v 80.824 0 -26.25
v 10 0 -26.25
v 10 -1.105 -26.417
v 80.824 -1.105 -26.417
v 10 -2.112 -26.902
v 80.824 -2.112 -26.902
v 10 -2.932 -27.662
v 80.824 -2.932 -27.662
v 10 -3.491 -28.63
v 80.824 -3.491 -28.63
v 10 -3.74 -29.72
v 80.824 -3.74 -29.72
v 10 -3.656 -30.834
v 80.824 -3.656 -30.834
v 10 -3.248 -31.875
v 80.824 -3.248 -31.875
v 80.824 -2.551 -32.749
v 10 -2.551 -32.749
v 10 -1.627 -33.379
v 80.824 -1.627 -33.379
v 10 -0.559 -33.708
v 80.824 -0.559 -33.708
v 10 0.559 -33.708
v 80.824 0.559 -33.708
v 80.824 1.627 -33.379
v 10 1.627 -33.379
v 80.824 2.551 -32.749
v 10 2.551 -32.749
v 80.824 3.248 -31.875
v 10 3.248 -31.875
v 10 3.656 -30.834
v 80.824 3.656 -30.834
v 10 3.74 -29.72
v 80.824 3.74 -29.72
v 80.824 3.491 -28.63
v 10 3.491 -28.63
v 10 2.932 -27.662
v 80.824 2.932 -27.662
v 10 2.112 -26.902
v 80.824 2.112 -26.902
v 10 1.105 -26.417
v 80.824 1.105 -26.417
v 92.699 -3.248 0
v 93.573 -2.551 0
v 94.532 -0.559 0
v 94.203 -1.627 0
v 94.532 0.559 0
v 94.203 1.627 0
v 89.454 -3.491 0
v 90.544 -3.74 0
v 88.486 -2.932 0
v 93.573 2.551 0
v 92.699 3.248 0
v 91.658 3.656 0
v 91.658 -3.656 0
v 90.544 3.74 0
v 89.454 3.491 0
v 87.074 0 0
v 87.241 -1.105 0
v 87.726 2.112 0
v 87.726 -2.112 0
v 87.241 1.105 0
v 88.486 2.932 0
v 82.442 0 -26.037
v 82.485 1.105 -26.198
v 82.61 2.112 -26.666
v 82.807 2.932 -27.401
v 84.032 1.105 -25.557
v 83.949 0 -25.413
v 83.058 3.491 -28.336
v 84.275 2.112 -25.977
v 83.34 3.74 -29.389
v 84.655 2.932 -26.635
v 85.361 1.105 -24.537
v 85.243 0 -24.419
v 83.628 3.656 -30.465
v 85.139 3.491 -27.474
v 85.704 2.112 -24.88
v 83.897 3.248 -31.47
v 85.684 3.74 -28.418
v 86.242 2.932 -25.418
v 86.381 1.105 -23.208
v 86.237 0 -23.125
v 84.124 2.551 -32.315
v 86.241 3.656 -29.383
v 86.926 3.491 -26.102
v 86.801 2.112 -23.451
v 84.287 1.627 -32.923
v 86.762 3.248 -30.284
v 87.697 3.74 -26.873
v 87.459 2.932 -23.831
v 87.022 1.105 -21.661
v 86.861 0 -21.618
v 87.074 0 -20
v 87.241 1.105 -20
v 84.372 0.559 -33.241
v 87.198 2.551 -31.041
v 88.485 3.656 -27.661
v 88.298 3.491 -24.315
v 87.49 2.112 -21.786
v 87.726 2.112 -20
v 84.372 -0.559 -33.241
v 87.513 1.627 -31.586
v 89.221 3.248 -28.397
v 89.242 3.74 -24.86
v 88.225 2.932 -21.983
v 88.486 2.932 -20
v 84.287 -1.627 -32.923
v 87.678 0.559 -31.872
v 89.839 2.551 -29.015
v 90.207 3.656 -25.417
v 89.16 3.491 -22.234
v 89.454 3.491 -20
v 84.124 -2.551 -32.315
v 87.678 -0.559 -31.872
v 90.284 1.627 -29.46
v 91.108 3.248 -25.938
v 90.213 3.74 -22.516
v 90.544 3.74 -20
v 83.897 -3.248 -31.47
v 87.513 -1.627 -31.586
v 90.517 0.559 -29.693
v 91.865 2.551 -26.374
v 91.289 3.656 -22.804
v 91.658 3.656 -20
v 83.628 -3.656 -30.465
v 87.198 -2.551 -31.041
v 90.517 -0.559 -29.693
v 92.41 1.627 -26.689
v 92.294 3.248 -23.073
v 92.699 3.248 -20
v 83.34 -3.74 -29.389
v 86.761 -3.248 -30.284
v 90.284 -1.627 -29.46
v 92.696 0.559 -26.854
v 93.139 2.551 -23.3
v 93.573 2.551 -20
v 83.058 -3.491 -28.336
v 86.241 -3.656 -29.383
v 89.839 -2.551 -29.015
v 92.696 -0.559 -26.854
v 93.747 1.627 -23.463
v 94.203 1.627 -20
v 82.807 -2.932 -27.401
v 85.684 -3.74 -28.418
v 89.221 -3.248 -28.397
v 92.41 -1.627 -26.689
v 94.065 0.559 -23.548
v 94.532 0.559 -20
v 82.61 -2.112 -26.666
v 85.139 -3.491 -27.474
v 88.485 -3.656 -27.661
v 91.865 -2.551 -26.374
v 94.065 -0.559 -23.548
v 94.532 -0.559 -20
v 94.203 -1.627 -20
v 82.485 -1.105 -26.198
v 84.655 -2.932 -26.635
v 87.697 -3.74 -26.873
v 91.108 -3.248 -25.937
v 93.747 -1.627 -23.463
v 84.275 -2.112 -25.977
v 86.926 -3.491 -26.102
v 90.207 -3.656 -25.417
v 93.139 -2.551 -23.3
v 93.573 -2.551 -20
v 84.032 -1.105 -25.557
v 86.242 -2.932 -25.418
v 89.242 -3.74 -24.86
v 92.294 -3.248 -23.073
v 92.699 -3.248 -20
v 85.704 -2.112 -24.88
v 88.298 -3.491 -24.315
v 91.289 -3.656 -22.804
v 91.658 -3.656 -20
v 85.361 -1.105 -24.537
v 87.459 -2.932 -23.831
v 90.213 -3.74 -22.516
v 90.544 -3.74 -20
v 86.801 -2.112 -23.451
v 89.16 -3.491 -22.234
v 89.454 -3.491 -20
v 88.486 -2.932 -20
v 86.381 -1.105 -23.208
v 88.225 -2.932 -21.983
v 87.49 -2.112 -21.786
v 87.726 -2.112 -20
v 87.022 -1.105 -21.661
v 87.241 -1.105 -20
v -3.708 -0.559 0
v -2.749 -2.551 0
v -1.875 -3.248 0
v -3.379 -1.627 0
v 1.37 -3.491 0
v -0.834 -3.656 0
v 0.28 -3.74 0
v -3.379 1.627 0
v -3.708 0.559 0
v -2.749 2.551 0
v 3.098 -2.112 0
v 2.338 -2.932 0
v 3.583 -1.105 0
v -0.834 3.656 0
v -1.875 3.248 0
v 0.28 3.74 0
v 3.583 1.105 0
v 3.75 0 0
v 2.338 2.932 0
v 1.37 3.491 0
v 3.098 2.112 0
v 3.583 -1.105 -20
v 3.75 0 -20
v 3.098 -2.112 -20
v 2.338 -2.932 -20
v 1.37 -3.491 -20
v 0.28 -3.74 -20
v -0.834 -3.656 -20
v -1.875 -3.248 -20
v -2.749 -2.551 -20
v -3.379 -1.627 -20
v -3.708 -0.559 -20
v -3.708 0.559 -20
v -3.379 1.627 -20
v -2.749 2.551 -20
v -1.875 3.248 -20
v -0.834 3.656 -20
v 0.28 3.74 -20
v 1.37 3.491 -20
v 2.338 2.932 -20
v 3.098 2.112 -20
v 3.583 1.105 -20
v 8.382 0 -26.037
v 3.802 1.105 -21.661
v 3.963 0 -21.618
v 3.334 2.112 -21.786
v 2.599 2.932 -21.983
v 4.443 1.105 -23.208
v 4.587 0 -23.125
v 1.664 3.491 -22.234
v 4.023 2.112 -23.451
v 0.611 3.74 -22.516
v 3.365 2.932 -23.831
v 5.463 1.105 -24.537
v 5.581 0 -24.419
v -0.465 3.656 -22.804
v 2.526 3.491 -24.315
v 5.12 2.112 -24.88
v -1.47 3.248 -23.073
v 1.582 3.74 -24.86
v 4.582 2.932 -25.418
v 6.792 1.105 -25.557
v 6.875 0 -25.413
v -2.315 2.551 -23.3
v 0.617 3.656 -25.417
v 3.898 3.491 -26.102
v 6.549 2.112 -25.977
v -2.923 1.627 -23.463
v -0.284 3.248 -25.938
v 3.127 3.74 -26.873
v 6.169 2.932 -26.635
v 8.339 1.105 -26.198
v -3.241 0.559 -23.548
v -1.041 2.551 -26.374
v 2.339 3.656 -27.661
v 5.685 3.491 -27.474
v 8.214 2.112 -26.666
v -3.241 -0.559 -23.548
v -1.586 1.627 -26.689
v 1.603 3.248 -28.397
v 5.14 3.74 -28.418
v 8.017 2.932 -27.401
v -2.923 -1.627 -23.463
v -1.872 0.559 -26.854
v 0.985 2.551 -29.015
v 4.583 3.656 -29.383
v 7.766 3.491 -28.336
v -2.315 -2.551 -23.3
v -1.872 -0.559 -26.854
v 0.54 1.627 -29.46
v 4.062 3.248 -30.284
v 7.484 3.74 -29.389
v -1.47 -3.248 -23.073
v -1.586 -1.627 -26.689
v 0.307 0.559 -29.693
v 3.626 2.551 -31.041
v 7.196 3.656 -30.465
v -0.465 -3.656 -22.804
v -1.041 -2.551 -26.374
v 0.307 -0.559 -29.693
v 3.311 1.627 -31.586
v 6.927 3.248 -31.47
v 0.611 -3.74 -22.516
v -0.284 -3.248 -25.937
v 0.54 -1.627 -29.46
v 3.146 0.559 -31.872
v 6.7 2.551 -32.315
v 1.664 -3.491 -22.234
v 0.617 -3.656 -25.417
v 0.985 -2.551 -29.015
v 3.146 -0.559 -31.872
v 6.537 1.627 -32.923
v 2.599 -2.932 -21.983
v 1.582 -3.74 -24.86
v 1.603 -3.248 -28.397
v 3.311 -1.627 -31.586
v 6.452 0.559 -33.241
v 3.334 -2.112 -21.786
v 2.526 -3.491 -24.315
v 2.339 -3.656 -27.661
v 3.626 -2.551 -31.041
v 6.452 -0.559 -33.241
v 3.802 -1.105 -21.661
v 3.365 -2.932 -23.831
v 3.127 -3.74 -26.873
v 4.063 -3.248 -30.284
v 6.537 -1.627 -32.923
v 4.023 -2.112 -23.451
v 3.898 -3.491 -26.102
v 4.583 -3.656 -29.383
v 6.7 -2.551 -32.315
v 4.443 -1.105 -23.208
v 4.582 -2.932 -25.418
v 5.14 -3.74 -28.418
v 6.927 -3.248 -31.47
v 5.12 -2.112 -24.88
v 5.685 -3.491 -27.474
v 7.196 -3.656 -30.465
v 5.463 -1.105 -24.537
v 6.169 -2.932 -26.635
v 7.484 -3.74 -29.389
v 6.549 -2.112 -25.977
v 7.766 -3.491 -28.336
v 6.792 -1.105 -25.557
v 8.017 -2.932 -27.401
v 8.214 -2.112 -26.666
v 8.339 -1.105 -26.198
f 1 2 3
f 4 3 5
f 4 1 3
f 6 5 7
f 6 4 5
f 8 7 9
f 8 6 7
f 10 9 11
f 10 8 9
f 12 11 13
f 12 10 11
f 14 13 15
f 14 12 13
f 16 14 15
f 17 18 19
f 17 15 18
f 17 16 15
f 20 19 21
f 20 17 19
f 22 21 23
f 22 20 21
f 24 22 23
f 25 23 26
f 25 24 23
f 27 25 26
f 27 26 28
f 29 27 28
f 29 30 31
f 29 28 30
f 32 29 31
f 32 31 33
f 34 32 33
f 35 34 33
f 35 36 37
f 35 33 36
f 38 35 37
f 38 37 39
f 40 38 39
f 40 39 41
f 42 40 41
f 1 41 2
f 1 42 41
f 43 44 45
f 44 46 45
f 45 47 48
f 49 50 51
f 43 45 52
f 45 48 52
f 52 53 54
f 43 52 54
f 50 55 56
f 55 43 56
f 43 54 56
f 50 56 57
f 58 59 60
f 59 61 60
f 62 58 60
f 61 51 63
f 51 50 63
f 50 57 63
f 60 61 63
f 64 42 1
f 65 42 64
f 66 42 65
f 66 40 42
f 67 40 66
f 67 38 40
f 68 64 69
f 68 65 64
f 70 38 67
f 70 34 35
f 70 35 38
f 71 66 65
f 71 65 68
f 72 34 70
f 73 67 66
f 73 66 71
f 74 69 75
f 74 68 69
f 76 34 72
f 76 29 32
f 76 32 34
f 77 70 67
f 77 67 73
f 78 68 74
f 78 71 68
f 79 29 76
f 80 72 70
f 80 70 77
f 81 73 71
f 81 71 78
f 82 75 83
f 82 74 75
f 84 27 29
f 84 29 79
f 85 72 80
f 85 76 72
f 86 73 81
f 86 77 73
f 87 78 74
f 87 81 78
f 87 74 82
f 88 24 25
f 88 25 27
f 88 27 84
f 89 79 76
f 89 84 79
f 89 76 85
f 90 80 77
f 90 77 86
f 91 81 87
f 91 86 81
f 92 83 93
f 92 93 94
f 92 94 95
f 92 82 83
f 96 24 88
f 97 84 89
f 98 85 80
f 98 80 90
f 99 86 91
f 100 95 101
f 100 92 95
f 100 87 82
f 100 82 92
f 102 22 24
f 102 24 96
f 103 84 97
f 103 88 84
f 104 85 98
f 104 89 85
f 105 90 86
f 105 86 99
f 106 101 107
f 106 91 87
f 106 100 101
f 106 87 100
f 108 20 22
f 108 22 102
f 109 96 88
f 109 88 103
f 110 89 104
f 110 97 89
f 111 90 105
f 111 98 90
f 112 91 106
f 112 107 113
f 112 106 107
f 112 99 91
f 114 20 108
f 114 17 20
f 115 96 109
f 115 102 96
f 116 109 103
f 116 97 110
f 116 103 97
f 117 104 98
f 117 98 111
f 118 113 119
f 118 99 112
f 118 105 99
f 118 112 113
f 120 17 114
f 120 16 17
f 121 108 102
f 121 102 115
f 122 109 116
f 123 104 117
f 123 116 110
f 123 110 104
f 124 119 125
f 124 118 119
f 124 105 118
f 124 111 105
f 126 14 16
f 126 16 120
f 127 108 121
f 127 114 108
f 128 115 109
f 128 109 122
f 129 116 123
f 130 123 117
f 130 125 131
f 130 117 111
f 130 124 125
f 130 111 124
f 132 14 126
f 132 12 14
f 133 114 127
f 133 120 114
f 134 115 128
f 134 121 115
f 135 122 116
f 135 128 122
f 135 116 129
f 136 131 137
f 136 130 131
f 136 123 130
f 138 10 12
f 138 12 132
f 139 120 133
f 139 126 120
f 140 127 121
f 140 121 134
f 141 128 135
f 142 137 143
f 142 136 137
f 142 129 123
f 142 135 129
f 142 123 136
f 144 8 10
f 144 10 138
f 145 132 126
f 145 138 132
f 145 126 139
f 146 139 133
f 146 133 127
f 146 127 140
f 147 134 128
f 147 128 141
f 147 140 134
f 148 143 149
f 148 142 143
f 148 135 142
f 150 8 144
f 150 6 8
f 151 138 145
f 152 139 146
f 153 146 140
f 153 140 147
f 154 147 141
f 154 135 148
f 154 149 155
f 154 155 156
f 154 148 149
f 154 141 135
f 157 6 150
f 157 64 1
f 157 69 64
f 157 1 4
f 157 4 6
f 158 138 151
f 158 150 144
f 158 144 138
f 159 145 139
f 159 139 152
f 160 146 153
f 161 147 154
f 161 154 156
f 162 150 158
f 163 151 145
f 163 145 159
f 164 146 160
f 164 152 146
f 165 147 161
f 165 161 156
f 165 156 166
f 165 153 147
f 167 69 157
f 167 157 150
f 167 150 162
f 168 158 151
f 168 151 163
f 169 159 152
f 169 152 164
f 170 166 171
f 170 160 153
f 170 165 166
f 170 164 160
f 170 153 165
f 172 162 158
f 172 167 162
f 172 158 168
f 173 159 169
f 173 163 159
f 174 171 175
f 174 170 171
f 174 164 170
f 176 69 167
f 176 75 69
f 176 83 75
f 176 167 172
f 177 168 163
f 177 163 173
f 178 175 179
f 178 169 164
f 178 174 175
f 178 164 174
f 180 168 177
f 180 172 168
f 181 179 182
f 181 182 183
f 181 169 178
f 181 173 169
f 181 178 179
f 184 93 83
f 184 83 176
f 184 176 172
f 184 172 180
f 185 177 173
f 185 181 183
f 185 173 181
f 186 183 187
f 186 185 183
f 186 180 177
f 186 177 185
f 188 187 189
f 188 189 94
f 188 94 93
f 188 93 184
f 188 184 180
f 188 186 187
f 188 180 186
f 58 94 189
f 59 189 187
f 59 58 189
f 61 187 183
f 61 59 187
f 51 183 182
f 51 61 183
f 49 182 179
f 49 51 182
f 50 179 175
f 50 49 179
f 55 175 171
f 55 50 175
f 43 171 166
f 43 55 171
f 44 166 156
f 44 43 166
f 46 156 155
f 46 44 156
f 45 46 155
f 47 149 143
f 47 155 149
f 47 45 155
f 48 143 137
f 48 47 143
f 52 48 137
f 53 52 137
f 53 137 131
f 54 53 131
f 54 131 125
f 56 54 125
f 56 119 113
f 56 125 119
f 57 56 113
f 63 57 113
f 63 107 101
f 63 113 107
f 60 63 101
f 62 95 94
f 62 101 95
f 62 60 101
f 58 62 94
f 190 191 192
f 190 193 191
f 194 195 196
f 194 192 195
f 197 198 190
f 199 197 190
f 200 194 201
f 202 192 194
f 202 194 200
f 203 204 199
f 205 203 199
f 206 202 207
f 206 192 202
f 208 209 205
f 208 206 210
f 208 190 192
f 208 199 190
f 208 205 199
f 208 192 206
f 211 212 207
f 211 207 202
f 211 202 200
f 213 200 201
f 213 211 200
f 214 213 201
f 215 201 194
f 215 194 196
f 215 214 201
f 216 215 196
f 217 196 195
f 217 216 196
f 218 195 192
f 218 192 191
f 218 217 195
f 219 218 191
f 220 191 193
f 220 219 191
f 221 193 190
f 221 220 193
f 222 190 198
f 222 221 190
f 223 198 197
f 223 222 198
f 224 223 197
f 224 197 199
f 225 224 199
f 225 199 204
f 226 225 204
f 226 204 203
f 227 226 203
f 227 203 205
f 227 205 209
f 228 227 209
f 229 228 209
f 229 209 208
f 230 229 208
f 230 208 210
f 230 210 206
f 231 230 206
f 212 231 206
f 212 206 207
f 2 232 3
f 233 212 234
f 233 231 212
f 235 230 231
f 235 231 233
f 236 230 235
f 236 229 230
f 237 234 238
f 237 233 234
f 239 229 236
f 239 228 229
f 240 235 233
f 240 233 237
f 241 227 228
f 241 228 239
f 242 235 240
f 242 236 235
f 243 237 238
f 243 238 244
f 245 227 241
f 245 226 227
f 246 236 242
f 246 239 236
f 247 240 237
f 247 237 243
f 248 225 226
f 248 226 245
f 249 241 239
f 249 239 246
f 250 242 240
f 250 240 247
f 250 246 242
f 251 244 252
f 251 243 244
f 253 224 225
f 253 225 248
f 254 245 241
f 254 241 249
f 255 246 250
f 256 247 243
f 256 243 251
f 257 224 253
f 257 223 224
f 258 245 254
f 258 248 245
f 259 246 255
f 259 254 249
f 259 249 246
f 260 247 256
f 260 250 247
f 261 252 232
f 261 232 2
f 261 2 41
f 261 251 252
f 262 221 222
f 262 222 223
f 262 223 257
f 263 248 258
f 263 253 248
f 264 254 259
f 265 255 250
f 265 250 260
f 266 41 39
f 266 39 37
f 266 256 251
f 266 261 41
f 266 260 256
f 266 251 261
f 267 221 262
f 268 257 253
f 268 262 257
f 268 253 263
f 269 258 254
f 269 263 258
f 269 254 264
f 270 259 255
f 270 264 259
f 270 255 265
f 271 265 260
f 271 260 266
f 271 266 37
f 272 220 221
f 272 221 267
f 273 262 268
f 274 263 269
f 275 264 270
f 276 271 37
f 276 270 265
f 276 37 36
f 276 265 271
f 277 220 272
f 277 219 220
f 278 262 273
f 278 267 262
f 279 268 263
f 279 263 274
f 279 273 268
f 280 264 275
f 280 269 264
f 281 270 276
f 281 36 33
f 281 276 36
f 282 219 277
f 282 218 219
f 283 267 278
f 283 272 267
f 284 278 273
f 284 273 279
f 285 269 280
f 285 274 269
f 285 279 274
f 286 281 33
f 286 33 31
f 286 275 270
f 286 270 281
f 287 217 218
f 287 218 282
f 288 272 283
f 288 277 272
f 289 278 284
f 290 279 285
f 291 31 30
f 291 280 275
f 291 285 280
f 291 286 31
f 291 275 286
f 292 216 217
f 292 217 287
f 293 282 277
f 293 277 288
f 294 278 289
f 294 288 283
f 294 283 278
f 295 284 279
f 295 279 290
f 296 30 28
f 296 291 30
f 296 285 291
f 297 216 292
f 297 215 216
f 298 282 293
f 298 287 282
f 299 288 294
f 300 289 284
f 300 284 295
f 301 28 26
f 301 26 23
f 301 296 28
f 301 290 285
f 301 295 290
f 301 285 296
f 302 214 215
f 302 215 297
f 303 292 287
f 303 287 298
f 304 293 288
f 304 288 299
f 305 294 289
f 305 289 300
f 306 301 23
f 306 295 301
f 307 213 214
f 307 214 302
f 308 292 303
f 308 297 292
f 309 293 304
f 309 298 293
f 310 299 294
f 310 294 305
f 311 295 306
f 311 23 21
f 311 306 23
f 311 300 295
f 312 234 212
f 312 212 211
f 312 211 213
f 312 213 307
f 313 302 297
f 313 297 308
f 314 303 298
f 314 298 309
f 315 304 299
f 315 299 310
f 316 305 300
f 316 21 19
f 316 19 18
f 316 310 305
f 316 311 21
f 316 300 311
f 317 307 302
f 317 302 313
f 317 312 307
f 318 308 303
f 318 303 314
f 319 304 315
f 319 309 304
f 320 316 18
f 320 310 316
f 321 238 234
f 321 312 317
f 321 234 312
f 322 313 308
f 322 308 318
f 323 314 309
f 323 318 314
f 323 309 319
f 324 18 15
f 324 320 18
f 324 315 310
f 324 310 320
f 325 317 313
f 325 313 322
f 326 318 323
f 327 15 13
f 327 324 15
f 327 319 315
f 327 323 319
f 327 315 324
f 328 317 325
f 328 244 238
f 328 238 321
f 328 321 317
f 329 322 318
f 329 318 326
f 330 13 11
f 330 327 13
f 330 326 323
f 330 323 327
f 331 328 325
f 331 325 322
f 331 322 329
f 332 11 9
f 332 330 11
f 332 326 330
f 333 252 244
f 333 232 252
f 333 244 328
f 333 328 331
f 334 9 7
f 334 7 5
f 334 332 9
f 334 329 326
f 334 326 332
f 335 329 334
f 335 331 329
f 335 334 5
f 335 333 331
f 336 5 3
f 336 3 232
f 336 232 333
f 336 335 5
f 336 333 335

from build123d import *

# Parameters (mm, degrees)
CROQUIS2_R = 3.75


with BuildPart() as part:
    # Barrer1: sweep along a path in Croquis1
    with BuildLine(Plane(origin=(0, 0, 0), x_dir=(1, 0, 0), z_dir=(0, 1, 0))) as barrer1_path:
        Line((0, 0), (0, 20))
        ThreePointArc((0, 20), (2.928932188, 27.071067812), (10, 30))
        Line((10, 30), (80.824, 30))
        ThreePointArc((80.824, 30), (87.895067812, 27.071067812), (90.824, 20))
        Line((90.824, 20), (90.824, 0))
    # Croquis2 → Barrer1 (sweep)
    with BuildSketch(Plane.XY):
        Circle(CROQUIS2_R)
    sweep(path=barrer1_path.line)


solid = part.part
